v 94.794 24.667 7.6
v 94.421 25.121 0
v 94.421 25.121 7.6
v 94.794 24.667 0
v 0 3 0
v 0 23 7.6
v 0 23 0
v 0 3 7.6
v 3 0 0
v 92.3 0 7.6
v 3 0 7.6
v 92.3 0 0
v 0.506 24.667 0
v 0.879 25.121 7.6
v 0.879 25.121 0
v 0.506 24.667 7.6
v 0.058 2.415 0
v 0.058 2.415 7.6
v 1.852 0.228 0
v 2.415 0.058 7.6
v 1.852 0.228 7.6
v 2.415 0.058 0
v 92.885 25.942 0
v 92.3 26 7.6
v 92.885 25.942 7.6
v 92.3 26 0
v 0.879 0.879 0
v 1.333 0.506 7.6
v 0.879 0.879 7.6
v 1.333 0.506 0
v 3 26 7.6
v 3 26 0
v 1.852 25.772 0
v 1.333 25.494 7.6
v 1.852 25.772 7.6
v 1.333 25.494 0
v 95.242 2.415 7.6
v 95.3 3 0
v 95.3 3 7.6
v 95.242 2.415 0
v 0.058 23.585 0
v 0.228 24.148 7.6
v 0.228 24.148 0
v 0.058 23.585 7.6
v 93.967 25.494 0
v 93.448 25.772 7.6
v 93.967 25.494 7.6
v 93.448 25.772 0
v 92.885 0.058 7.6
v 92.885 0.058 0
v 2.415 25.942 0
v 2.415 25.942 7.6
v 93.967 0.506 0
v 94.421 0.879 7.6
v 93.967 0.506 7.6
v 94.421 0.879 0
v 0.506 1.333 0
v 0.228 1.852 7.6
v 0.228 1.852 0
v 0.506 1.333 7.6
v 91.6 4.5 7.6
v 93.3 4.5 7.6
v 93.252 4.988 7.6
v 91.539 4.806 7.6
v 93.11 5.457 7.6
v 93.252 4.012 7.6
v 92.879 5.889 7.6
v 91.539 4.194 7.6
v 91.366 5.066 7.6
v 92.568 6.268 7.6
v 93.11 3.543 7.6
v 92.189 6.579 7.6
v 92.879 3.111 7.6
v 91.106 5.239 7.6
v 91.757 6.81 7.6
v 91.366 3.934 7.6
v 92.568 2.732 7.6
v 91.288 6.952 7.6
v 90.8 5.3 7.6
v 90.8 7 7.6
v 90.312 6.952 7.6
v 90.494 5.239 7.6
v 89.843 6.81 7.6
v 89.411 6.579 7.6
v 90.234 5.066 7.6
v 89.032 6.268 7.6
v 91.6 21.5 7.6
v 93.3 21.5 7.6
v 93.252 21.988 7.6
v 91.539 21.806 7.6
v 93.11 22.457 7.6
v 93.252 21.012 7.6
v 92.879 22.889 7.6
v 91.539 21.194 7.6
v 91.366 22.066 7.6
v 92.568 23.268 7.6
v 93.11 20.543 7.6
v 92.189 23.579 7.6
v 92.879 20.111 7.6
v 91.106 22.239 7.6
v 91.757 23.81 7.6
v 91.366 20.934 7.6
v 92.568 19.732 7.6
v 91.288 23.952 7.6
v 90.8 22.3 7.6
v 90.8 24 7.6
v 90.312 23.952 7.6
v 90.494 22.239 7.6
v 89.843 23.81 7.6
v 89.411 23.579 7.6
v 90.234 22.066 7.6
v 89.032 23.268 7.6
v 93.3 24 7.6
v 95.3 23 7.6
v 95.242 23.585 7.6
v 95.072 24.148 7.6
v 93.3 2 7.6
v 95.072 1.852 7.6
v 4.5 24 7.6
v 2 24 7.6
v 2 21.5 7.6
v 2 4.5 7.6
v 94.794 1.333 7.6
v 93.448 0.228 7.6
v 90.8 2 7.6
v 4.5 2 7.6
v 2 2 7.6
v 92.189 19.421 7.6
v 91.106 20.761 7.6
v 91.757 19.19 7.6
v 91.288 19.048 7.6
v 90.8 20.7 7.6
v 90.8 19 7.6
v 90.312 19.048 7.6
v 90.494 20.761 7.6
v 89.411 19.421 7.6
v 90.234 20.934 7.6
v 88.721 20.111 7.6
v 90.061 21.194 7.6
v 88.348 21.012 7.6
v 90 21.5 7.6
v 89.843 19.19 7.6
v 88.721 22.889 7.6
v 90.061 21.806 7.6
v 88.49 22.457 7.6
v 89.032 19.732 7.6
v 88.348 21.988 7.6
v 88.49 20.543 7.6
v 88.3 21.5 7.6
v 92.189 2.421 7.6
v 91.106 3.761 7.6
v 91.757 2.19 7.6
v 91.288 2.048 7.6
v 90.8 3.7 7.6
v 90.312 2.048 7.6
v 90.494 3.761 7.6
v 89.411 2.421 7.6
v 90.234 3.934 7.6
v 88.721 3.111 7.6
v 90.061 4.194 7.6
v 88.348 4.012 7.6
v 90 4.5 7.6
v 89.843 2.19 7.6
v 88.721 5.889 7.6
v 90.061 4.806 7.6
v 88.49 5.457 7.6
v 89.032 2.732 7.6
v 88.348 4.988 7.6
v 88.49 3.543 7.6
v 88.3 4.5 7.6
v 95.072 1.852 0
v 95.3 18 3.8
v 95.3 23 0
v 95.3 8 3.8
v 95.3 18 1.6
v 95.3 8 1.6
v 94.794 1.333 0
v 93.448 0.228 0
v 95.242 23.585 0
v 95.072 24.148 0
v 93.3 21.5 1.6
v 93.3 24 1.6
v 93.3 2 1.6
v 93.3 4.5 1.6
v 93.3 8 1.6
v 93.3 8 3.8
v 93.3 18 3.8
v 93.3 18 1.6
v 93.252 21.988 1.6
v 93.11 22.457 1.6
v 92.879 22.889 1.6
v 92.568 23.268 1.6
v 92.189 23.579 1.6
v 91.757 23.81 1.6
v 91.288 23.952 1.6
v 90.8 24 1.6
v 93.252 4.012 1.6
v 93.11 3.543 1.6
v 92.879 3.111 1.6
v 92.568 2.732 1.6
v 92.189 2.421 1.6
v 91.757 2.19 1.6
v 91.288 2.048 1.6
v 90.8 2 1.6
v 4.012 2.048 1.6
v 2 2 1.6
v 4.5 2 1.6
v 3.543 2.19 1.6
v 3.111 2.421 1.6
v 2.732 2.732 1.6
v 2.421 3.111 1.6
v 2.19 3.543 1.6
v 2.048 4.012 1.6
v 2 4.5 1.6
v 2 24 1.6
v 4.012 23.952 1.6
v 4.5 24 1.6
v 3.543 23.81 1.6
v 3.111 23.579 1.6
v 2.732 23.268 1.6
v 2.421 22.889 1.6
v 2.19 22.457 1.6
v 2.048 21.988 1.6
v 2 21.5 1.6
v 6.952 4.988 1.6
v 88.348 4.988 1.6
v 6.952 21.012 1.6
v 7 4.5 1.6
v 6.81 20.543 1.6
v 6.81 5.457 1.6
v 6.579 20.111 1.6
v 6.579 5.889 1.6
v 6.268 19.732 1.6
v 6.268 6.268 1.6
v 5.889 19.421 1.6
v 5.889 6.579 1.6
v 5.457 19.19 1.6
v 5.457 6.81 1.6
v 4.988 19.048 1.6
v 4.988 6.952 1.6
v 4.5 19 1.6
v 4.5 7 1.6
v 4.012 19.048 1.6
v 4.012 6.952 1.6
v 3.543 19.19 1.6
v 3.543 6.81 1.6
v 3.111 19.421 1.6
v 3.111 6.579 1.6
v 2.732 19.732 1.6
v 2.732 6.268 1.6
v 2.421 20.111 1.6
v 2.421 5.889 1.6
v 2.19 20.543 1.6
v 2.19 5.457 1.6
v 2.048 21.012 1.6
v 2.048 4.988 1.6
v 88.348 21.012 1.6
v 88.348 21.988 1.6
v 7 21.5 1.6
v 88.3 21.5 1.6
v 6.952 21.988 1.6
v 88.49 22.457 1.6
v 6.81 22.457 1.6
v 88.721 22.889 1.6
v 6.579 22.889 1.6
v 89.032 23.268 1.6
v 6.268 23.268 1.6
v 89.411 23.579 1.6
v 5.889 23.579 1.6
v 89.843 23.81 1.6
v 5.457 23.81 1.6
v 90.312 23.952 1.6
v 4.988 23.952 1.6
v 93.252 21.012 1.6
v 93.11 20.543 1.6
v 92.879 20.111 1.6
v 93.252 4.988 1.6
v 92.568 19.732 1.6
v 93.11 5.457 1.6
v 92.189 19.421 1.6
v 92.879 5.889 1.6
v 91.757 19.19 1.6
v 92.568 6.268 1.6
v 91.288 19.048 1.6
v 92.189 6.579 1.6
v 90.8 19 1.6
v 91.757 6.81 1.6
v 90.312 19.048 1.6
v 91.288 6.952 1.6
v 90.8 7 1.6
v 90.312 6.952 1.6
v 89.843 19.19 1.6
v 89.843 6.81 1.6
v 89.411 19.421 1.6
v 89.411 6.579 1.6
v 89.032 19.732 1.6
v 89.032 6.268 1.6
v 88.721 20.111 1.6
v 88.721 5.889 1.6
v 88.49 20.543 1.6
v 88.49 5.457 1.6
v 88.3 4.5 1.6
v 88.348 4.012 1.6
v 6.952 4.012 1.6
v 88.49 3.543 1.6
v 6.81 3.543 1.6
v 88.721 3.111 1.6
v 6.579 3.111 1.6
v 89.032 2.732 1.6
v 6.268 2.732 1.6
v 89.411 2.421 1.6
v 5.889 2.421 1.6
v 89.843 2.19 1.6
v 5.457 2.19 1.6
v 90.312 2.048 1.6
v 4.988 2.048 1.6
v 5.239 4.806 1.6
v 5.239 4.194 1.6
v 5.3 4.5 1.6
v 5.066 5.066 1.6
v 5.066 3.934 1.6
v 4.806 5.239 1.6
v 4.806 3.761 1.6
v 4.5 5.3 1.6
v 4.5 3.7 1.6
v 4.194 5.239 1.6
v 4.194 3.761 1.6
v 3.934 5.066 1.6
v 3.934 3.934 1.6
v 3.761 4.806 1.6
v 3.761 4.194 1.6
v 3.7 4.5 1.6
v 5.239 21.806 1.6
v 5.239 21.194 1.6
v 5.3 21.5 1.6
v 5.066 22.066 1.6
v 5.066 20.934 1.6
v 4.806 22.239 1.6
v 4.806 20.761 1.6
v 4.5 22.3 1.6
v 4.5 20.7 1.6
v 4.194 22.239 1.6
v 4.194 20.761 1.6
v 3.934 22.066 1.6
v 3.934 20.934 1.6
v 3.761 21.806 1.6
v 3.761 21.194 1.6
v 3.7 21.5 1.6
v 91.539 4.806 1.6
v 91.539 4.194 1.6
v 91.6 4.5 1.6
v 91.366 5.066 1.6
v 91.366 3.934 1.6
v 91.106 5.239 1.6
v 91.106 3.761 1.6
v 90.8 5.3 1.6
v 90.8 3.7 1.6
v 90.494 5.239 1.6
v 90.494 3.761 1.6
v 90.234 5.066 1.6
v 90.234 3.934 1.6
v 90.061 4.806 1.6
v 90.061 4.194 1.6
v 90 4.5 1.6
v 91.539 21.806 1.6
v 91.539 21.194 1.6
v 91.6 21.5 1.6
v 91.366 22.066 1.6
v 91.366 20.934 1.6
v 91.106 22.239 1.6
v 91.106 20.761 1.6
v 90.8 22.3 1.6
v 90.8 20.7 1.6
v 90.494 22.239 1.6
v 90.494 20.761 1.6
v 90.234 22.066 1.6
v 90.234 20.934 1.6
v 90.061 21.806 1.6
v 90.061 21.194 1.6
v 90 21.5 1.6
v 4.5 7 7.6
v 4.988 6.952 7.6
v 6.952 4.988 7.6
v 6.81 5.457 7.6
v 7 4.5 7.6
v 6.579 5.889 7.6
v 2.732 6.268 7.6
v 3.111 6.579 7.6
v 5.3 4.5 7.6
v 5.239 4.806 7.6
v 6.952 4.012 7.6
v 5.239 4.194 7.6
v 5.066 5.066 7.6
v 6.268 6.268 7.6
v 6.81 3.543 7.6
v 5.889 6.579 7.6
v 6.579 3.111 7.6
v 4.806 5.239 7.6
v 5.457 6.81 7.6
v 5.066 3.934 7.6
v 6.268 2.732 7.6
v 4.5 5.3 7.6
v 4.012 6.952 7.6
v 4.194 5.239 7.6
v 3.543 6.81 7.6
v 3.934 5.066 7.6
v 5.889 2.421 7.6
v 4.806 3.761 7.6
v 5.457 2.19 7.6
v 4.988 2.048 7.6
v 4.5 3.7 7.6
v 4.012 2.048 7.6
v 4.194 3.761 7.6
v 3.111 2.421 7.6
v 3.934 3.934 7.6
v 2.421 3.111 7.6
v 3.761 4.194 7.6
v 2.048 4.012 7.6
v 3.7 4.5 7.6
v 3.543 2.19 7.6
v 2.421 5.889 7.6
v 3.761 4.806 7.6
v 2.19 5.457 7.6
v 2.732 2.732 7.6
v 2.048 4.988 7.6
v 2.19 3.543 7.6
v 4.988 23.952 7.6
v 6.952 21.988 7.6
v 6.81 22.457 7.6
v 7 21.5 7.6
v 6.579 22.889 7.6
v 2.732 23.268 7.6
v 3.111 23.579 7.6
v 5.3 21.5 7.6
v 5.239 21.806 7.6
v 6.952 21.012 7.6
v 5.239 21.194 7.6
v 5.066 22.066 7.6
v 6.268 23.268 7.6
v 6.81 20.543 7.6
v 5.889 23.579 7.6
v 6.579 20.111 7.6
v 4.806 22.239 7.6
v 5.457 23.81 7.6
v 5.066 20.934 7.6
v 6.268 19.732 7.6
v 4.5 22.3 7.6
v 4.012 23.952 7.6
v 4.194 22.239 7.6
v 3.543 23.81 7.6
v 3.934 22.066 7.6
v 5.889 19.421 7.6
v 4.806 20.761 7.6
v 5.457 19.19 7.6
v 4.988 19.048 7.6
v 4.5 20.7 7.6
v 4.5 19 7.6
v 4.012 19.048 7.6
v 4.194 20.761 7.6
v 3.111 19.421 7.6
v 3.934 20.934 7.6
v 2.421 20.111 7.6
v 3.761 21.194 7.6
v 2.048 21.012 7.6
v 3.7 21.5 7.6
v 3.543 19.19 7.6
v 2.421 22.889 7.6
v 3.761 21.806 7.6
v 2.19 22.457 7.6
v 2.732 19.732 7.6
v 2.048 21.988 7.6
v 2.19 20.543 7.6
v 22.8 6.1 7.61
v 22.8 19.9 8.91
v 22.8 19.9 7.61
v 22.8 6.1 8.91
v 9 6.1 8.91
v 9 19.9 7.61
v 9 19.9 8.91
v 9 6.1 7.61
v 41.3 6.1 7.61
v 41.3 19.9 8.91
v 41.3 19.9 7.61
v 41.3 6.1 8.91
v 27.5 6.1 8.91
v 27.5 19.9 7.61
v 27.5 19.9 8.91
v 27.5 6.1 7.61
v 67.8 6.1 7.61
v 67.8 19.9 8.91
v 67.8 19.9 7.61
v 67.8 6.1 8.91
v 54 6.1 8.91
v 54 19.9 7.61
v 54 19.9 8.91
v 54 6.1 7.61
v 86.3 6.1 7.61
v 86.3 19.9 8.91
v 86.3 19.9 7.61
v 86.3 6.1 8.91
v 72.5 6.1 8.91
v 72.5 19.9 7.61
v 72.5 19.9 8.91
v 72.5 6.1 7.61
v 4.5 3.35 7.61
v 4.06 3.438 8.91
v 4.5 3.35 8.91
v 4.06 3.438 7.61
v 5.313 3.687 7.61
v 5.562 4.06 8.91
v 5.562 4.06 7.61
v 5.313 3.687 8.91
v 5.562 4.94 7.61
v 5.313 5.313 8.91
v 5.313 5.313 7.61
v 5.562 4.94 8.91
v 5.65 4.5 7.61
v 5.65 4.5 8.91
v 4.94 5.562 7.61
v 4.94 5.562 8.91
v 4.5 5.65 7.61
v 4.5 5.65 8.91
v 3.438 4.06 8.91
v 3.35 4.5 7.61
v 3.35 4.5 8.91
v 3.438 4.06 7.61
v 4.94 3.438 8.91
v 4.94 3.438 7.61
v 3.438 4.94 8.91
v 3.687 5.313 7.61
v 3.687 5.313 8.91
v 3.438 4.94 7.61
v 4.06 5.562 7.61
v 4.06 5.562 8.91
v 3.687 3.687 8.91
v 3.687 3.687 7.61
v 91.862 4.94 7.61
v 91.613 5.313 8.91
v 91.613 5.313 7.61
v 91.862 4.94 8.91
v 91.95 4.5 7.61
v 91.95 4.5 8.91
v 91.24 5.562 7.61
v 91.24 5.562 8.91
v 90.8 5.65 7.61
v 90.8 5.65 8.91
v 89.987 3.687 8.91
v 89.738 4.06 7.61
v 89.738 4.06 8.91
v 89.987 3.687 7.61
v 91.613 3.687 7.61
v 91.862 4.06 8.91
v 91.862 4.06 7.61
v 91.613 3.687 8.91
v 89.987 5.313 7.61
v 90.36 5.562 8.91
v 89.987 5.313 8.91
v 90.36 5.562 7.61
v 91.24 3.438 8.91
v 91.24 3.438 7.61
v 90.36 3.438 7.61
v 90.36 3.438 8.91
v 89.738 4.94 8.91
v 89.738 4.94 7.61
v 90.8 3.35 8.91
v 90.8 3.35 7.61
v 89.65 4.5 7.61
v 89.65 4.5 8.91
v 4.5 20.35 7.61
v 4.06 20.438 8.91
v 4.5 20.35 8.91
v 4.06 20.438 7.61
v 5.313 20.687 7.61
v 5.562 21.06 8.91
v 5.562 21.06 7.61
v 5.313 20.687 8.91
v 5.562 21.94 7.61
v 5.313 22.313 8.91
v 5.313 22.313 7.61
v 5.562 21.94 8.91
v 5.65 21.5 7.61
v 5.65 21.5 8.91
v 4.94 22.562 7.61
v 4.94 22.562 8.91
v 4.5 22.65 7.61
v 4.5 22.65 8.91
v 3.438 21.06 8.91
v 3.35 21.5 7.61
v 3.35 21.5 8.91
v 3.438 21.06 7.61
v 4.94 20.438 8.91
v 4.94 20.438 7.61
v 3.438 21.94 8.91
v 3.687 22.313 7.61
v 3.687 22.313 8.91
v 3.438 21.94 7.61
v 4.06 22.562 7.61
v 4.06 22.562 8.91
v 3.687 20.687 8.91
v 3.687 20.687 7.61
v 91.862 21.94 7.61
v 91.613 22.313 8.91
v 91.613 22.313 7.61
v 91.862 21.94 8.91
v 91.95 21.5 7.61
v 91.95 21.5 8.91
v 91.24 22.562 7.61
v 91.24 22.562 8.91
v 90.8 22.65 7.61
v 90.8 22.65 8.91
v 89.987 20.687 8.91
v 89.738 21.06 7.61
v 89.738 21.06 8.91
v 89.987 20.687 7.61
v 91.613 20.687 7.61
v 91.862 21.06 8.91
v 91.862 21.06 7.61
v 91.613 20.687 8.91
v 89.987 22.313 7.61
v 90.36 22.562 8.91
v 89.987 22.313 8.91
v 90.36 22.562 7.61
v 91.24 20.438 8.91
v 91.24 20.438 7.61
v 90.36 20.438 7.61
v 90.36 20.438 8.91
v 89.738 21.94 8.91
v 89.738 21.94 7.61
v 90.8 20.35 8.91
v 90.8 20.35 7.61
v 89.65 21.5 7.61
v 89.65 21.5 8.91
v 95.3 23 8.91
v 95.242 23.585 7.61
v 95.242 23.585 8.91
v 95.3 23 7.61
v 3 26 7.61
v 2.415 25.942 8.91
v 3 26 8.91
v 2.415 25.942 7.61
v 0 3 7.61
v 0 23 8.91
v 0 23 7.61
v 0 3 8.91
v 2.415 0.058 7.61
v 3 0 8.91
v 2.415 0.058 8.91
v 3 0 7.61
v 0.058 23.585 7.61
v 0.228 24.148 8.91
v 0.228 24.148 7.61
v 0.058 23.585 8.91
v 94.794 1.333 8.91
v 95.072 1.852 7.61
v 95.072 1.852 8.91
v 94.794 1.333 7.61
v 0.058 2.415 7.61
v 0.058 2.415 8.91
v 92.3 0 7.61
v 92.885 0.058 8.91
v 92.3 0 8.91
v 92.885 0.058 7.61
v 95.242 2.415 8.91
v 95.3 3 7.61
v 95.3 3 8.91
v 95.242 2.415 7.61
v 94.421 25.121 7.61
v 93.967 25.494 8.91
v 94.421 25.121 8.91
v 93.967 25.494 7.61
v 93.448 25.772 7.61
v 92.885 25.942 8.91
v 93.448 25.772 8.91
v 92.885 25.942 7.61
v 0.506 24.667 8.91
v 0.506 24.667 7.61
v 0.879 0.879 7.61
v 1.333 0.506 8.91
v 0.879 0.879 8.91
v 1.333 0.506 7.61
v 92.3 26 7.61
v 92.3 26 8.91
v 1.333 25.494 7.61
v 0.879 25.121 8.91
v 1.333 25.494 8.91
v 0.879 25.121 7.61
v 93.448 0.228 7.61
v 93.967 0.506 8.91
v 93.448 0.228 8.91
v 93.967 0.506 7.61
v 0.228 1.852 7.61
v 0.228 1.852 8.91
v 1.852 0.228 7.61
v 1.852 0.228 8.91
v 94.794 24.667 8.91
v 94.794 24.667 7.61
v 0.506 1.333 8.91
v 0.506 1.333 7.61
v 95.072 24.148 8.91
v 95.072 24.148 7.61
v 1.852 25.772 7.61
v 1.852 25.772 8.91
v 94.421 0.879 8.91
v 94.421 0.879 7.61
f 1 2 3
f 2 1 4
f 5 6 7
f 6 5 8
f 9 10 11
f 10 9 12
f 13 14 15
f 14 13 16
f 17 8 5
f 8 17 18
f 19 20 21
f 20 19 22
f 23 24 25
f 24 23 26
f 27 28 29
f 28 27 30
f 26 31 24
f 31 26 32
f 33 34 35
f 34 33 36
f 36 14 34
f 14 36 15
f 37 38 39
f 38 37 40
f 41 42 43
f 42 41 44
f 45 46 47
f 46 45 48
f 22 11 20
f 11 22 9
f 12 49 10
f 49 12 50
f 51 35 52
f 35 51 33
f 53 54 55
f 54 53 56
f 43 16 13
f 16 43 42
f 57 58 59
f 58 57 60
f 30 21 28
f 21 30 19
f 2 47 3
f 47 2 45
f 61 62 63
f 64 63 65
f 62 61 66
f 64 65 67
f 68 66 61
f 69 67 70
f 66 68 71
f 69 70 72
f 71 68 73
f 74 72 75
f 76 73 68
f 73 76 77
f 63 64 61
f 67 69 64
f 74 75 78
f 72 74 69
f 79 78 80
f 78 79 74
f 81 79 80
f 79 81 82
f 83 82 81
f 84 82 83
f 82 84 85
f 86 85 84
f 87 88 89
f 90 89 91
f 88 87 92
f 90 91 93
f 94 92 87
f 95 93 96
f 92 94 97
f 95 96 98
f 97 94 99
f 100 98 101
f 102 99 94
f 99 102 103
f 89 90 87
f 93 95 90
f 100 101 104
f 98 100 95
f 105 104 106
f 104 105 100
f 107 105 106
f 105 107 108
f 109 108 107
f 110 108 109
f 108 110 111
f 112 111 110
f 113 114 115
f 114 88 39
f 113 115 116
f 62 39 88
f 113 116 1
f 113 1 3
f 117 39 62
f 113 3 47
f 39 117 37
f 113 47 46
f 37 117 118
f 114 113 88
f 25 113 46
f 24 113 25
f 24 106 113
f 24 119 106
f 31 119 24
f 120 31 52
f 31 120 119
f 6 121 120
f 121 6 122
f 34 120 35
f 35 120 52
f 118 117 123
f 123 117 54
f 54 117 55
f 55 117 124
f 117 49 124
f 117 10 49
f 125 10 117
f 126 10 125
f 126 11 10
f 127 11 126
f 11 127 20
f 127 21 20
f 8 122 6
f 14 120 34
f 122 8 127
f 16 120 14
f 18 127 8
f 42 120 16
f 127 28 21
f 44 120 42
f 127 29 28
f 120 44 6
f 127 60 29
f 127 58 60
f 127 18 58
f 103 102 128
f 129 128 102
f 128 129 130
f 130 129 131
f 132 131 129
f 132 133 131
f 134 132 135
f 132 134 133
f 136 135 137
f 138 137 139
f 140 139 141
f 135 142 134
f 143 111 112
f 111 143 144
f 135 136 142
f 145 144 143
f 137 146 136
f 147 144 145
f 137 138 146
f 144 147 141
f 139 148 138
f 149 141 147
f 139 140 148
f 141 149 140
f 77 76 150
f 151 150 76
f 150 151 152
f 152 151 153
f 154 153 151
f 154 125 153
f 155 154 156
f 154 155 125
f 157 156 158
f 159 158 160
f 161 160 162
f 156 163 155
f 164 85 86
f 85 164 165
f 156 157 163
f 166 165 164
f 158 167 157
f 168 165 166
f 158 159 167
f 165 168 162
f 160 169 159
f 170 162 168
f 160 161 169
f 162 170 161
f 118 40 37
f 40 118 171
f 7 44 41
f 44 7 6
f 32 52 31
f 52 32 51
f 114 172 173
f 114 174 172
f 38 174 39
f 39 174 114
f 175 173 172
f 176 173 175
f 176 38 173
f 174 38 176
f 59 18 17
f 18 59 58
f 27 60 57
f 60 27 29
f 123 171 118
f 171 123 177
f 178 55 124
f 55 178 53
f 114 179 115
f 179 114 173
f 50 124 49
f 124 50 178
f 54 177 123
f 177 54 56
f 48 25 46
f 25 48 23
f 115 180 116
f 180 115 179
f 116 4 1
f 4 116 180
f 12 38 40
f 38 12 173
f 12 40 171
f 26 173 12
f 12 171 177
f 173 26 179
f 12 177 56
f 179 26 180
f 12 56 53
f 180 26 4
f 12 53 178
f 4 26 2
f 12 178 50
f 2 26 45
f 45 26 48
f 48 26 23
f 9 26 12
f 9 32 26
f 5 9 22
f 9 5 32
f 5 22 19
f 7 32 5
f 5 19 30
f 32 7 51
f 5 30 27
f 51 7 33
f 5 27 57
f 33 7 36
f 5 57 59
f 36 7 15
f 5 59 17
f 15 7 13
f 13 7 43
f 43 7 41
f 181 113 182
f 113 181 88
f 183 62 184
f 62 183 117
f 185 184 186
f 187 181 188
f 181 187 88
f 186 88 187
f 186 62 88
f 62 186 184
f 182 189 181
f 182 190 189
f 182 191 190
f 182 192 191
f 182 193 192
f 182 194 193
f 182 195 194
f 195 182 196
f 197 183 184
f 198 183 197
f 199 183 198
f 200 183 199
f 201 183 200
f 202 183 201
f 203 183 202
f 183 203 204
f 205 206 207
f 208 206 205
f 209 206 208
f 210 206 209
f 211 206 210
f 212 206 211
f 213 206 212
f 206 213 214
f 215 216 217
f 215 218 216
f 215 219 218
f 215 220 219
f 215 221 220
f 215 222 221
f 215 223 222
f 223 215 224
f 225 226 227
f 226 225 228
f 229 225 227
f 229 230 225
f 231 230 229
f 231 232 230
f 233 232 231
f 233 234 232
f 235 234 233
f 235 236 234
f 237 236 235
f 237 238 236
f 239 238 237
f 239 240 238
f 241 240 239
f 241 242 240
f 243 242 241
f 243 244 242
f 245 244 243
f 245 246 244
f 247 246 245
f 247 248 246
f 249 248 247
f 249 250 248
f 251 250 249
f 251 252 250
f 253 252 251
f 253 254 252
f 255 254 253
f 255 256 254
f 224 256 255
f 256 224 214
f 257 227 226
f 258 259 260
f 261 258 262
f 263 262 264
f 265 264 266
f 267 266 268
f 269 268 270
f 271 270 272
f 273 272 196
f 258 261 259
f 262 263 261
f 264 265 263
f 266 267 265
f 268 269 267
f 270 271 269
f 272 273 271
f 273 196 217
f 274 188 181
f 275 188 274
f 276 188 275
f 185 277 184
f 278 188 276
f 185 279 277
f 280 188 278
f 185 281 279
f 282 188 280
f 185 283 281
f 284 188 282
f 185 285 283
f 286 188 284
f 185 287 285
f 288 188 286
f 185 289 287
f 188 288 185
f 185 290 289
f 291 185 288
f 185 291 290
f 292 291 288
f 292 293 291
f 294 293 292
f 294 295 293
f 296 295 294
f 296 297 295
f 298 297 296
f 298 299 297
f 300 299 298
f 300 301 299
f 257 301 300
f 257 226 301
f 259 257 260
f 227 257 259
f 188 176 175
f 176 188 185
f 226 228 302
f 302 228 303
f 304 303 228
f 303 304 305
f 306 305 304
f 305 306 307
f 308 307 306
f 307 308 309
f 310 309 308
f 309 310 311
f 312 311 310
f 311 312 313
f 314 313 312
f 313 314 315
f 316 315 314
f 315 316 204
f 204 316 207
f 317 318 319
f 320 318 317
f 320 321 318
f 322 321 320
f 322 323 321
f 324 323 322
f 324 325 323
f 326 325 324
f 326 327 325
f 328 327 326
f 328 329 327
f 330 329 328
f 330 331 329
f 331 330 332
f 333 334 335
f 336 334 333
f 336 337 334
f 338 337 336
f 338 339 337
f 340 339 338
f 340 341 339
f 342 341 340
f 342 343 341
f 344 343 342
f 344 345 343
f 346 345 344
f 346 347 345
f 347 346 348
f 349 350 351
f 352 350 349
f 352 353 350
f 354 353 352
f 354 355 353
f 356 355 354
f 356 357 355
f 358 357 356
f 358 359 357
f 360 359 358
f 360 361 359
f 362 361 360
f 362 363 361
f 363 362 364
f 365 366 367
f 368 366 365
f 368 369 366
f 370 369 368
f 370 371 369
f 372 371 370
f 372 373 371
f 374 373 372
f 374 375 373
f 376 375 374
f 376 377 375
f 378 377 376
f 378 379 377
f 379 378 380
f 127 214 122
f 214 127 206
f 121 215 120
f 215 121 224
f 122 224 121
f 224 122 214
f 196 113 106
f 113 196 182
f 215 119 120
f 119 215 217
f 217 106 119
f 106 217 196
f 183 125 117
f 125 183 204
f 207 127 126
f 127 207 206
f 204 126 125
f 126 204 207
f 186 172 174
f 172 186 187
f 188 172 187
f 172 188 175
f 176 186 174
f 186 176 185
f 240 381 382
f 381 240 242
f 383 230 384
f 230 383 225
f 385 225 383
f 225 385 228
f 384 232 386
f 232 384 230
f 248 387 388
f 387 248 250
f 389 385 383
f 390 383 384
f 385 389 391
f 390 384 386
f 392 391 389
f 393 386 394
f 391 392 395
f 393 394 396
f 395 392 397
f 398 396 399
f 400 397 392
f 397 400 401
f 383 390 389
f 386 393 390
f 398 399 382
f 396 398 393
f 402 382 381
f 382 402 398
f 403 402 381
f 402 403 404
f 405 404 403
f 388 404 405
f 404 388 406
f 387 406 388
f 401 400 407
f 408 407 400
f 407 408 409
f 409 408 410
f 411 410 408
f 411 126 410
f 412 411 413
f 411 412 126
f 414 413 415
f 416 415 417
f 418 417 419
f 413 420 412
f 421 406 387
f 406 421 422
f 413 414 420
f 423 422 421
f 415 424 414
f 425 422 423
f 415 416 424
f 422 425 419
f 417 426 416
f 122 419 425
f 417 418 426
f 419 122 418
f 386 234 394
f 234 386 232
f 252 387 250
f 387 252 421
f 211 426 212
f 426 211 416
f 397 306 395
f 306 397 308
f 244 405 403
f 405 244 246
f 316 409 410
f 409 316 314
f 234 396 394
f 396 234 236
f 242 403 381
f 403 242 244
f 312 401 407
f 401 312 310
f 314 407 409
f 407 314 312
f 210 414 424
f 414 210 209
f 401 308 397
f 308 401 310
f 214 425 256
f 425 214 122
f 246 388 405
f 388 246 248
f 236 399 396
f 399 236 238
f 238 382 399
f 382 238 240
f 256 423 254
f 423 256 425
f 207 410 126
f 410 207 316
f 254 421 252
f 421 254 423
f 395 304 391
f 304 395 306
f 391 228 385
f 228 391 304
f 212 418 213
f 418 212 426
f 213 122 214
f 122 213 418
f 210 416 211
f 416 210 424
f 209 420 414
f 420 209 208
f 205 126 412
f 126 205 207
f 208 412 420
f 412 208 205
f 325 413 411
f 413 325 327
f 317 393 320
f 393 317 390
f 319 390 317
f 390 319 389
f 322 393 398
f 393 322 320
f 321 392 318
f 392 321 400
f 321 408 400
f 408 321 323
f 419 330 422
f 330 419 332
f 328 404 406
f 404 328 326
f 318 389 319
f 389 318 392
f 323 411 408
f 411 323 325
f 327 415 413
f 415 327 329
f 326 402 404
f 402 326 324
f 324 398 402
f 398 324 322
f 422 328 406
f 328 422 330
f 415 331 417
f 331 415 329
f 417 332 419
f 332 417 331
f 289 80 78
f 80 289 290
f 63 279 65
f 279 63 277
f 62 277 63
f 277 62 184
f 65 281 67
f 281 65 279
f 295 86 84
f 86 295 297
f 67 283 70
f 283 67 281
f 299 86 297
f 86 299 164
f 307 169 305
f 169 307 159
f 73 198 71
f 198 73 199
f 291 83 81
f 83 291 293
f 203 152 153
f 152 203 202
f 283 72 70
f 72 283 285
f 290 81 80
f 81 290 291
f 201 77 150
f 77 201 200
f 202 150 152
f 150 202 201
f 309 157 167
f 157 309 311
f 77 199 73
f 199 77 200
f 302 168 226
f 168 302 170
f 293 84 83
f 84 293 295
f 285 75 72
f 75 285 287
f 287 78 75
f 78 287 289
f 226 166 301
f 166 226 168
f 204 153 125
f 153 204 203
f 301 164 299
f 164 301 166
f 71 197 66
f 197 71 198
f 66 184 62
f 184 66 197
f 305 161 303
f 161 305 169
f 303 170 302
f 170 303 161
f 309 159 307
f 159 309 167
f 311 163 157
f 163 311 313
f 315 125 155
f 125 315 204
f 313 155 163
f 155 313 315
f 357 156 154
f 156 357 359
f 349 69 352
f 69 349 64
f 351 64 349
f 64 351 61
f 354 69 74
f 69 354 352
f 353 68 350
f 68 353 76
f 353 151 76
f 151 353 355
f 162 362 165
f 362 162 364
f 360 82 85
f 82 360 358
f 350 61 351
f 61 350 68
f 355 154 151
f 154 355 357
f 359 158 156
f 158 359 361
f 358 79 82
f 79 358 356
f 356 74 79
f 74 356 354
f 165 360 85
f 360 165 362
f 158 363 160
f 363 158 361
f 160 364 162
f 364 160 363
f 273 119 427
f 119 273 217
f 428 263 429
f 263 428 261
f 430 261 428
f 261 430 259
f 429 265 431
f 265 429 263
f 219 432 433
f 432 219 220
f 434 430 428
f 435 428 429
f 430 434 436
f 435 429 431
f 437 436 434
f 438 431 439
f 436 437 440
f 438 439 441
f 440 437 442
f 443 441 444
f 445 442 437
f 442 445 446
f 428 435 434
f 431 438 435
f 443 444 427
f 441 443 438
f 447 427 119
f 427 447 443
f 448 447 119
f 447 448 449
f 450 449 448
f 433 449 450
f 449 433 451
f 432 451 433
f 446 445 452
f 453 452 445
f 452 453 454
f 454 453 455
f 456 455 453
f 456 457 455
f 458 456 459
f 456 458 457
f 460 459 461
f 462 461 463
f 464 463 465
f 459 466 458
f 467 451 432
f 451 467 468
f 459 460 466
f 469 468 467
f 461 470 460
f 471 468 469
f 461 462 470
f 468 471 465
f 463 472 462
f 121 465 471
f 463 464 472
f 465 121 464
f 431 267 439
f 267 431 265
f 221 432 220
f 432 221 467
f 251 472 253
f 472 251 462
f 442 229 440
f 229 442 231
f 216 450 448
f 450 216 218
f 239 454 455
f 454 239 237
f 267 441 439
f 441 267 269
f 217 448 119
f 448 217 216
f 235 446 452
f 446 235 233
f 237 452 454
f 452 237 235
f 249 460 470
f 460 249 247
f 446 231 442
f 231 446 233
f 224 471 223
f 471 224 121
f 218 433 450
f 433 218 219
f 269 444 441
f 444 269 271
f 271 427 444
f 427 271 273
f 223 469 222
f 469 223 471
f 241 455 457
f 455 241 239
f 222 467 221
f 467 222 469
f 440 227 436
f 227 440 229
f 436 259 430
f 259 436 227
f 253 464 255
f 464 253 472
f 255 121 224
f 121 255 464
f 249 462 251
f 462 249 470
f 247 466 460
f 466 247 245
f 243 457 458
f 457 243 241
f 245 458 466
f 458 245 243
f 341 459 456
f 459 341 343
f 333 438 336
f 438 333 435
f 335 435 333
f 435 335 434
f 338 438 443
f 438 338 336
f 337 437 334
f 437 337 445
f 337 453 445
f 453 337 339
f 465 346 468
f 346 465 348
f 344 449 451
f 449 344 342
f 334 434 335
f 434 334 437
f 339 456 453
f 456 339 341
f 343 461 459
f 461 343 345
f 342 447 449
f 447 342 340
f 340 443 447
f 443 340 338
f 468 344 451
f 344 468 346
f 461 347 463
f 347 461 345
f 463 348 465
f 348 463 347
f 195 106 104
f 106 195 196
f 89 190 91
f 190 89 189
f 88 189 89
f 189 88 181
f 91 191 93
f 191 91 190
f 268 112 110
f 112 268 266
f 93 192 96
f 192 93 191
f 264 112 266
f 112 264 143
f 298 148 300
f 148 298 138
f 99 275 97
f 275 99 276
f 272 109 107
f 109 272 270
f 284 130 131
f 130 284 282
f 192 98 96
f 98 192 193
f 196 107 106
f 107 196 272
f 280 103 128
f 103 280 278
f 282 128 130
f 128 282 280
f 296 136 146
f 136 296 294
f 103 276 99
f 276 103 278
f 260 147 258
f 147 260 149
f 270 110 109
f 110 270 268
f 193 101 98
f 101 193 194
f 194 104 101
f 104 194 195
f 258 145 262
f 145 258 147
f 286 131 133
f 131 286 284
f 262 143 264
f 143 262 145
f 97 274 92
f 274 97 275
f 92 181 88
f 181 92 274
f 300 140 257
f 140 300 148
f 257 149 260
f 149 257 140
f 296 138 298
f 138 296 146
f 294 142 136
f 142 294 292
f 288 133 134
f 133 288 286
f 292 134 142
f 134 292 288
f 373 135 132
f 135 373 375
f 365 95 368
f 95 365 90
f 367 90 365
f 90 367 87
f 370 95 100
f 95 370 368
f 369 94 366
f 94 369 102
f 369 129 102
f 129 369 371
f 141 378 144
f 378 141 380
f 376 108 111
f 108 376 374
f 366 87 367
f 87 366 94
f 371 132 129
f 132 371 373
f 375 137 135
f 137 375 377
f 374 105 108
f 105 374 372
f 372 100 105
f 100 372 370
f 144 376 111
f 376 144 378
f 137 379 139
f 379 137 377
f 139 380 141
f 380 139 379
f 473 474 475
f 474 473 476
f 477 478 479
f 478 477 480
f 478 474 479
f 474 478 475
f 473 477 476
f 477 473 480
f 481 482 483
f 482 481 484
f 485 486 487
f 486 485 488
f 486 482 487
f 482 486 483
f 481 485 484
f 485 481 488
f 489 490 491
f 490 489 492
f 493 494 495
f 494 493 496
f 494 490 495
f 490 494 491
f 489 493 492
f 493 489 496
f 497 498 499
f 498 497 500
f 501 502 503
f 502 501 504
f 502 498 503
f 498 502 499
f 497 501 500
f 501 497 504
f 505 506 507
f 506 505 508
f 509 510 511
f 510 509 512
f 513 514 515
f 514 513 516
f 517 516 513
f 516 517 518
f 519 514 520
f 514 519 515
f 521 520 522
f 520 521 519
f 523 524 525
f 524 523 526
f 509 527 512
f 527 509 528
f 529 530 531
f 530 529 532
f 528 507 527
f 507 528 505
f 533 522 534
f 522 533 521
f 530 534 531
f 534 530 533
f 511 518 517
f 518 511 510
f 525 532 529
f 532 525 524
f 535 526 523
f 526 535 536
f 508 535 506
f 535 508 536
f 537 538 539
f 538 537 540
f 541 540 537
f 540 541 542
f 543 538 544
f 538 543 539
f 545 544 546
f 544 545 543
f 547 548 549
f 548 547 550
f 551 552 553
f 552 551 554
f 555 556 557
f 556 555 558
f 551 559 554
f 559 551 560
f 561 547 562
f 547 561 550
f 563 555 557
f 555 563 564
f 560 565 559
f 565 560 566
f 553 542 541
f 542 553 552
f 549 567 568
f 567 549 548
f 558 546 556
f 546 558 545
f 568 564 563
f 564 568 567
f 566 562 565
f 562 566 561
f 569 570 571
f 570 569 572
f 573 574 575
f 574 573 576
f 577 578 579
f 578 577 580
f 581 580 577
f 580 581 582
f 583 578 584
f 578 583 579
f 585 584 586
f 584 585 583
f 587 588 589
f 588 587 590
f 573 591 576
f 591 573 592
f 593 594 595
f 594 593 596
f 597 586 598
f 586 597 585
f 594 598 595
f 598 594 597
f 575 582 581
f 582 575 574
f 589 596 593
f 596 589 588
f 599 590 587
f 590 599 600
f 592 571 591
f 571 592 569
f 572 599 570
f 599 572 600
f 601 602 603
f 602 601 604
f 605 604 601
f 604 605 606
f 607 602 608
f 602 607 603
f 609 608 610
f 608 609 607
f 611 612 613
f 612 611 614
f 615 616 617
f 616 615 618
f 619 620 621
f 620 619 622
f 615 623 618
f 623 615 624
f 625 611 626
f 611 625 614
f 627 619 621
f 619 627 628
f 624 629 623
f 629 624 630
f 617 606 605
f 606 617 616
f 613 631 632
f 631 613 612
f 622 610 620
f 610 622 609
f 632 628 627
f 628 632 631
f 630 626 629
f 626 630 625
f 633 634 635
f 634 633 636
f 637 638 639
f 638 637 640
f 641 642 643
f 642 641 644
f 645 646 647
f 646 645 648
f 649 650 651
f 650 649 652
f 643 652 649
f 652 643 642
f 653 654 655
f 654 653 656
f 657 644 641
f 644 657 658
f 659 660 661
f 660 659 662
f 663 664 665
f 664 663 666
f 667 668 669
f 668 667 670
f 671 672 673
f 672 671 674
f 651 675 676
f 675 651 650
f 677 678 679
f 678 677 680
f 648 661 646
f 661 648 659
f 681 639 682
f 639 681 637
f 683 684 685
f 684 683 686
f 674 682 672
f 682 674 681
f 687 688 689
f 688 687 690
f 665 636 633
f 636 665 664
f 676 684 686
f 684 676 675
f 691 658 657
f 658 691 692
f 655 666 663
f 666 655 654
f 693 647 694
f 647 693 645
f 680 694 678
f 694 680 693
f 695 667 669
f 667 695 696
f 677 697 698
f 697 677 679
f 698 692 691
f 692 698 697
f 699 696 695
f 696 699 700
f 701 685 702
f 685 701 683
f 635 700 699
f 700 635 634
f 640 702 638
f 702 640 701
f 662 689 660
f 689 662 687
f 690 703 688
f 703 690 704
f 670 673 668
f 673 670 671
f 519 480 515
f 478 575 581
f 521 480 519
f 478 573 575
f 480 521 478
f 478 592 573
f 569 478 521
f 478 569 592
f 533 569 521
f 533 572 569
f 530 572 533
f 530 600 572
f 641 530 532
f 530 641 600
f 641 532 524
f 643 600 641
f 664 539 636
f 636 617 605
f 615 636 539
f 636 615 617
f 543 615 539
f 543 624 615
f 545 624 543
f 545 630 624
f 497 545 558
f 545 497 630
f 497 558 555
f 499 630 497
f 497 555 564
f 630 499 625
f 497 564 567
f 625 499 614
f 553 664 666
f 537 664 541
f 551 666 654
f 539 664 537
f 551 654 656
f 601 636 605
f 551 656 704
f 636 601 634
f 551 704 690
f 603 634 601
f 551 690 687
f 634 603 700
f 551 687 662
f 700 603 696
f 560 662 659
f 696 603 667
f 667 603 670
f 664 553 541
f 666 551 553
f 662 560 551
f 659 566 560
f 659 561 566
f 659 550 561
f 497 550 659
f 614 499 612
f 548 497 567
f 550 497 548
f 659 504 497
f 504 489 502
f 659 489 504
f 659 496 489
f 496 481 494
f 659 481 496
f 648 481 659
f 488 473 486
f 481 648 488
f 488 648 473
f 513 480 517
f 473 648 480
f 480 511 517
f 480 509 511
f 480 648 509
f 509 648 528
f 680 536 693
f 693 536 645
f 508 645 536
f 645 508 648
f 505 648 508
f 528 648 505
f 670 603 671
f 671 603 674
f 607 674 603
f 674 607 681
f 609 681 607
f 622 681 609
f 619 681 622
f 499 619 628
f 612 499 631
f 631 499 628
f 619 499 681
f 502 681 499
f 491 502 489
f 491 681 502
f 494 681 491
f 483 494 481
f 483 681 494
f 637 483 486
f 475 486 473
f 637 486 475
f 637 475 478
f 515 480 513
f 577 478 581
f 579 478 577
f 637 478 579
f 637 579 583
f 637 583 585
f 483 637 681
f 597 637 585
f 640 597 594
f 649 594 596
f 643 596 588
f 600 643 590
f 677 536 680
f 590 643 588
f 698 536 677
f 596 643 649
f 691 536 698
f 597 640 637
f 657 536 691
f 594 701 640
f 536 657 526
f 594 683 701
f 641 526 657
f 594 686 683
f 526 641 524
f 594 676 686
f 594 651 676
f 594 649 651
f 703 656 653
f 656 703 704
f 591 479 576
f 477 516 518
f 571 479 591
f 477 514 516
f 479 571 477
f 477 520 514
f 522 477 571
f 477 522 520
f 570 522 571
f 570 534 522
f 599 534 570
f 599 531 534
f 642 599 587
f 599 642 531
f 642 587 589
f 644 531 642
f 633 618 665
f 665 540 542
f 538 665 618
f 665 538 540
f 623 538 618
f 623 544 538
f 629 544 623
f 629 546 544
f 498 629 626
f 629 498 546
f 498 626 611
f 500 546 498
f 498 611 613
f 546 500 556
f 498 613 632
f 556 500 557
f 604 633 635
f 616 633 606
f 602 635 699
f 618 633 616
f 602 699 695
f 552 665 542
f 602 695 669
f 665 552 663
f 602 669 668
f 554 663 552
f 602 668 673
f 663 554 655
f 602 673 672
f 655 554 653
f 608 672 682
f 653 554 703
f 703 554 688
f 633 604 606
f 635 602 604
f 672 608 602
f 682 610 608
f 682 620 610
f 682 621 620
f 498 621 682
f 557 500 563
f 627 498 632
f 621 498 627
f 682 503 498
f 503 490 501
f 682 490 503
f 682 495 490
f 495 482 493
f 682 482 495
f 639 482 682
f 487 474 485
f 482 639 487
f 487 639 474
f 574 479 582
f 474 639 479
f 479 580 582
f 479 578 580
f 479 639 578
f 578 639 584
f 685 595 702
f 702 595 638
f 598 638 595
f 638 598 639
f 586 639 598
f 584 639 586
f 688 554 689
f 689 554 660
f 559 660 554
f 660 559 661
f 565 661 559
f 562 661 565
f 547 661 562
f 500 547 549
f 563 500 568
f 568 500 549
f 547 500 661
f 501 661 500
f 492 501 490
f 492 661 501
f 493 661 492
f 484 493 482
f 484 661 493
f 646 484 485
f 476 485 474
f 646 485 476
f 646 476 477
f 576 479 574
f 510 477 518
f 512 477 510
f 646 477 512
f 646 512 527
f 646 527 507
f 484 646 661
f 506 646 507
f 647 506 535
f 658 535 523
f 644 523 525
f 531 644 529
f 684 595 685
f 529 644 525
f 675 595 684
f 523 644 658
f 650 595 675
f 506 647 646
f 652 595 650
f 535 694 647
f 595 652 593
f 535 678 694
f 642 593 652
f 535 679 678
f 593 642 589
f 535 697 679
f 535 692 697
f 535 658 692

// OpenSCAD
// Glass button bar for the Seeburg Firestar jukebox
// 4 x Kailh Choc v1 low-profile switches in a slim tray that sticks to the
// glass (black border area) with VHB tape. Two printed parts:
//   part = "tray"  : floor + walls, ribbon slot at one end
//   part = "plate" : top plate the switches clip into
// Render each one (F6) and export STL. Print both flat side down.

part = "both";          // "tray", "plate" or "both" (preview)

// ---- layout -------------------------------------------------------------
pitch     = 18.5;       // centre-to-centre of keys (Choc caps are ~17.5 x 16.5)
group_gap = 8;          // extra space between the arrow pair and Genre/Random
// key x positions: [ <, >, Genre, Random ]
keys = [0, pitch, 2*pitch + group_gap, 3*pitch + group_gap];

margin    = 7;          // wall-to-key-edge room at each end
depth     = 26;         // front-to-back size of the bar
wall      = 2.0;
floor_t   = 1.6;        // this face sits on the glass
cavity_h  = 6.0;        // room under the plate for switch bodies, pins and solder
plate_t   = 1.3;        // Choc v1 clips need a 1.2-1.3 mm plate
cut       = 13.8;       // Choc v1 plate cutout (square)
corner_r  = 3;

slot_w    = 10;         // ribbon exit (6-wire 1.27 mm ribbon is ~7.6 mm wide)
slot_h    = 2.2;

screw_pilot = 1.6;      // M2 self-tapping into the bosses
screw_clear = 2.3;
boss_d      = 5;

span   = keys[3] - keys[0];
length = span + cut + 2*margin + 2*wall;
x0     = wall + margin + cut/2;           // x of first key centre
yc     = depth/2;

boss_pos = [[wall + boss_d/2, wall + boss_d/2],
            [length - wall - boss_d/2, wall + boss_d/2],
            [wall + boss_d/2, depth - wall - boss_d/2],
            [length - wall - boss_d/2, depth - wall - boss_d/2]];

module rbox(l, d, h, r) {
    hull() for (x = [r, l - r], y = [r, d - r]) translate([x, y, 0]) cylinder(r = r, h = h, $fn = 32);
}

module tray() {
    difference() {
        rbox(length, depth, floor_t + cavity_h, corner_r);
        // cavity
        translate([wall, wall, floor_t]) cube([length - 2*wall, depth - 2*wall, cavity_h + 1]);
        // ribbon slot, right end, at floor level
        translate([length - wall - 1, yc - slot_w/2, floor_t]) cube([wall + 2, slot_w, slot_h]);
    }
    // screw bosses
    for (p = boss_pos) translate([p[0], p[1], 0]) difference() {
        cylinder(d = boss_d, h = floor_t + cavity_h, $fn = 32);
        translate([0, 0, floor_t]) cylinder(d = screw_pilot, h = cavity_h + 1, $fn = 16);
    }
}

module plate() {
    difference() {
        rbox(length, depth, plate_t, corner_r);
        for (k = keys) translate([x0 + k - cut/2, yc - cut/2, -1]) cube([cut, cut, plate_t + 2]);
        for (p = boss_pos) translate([p[0], p[1], -1]) cylinder(d = screw_clear, h = plate_t + 2, $fn = 16);
    }
}

if (part == "tray") tray();
else if (part == "plate") plate();
else { tray(); color("silver") translate([0, 0, floor_t + cavity_h + 0.01]) plate(); }

echo(str("Bar size: ", length, " x ", depth, " mm, ",
         floor_t + cavity_h + plate_t, " mm tall before switches (~", floor_t + cavity_h + plate_t + 8, " mm with Choc caps)"));
